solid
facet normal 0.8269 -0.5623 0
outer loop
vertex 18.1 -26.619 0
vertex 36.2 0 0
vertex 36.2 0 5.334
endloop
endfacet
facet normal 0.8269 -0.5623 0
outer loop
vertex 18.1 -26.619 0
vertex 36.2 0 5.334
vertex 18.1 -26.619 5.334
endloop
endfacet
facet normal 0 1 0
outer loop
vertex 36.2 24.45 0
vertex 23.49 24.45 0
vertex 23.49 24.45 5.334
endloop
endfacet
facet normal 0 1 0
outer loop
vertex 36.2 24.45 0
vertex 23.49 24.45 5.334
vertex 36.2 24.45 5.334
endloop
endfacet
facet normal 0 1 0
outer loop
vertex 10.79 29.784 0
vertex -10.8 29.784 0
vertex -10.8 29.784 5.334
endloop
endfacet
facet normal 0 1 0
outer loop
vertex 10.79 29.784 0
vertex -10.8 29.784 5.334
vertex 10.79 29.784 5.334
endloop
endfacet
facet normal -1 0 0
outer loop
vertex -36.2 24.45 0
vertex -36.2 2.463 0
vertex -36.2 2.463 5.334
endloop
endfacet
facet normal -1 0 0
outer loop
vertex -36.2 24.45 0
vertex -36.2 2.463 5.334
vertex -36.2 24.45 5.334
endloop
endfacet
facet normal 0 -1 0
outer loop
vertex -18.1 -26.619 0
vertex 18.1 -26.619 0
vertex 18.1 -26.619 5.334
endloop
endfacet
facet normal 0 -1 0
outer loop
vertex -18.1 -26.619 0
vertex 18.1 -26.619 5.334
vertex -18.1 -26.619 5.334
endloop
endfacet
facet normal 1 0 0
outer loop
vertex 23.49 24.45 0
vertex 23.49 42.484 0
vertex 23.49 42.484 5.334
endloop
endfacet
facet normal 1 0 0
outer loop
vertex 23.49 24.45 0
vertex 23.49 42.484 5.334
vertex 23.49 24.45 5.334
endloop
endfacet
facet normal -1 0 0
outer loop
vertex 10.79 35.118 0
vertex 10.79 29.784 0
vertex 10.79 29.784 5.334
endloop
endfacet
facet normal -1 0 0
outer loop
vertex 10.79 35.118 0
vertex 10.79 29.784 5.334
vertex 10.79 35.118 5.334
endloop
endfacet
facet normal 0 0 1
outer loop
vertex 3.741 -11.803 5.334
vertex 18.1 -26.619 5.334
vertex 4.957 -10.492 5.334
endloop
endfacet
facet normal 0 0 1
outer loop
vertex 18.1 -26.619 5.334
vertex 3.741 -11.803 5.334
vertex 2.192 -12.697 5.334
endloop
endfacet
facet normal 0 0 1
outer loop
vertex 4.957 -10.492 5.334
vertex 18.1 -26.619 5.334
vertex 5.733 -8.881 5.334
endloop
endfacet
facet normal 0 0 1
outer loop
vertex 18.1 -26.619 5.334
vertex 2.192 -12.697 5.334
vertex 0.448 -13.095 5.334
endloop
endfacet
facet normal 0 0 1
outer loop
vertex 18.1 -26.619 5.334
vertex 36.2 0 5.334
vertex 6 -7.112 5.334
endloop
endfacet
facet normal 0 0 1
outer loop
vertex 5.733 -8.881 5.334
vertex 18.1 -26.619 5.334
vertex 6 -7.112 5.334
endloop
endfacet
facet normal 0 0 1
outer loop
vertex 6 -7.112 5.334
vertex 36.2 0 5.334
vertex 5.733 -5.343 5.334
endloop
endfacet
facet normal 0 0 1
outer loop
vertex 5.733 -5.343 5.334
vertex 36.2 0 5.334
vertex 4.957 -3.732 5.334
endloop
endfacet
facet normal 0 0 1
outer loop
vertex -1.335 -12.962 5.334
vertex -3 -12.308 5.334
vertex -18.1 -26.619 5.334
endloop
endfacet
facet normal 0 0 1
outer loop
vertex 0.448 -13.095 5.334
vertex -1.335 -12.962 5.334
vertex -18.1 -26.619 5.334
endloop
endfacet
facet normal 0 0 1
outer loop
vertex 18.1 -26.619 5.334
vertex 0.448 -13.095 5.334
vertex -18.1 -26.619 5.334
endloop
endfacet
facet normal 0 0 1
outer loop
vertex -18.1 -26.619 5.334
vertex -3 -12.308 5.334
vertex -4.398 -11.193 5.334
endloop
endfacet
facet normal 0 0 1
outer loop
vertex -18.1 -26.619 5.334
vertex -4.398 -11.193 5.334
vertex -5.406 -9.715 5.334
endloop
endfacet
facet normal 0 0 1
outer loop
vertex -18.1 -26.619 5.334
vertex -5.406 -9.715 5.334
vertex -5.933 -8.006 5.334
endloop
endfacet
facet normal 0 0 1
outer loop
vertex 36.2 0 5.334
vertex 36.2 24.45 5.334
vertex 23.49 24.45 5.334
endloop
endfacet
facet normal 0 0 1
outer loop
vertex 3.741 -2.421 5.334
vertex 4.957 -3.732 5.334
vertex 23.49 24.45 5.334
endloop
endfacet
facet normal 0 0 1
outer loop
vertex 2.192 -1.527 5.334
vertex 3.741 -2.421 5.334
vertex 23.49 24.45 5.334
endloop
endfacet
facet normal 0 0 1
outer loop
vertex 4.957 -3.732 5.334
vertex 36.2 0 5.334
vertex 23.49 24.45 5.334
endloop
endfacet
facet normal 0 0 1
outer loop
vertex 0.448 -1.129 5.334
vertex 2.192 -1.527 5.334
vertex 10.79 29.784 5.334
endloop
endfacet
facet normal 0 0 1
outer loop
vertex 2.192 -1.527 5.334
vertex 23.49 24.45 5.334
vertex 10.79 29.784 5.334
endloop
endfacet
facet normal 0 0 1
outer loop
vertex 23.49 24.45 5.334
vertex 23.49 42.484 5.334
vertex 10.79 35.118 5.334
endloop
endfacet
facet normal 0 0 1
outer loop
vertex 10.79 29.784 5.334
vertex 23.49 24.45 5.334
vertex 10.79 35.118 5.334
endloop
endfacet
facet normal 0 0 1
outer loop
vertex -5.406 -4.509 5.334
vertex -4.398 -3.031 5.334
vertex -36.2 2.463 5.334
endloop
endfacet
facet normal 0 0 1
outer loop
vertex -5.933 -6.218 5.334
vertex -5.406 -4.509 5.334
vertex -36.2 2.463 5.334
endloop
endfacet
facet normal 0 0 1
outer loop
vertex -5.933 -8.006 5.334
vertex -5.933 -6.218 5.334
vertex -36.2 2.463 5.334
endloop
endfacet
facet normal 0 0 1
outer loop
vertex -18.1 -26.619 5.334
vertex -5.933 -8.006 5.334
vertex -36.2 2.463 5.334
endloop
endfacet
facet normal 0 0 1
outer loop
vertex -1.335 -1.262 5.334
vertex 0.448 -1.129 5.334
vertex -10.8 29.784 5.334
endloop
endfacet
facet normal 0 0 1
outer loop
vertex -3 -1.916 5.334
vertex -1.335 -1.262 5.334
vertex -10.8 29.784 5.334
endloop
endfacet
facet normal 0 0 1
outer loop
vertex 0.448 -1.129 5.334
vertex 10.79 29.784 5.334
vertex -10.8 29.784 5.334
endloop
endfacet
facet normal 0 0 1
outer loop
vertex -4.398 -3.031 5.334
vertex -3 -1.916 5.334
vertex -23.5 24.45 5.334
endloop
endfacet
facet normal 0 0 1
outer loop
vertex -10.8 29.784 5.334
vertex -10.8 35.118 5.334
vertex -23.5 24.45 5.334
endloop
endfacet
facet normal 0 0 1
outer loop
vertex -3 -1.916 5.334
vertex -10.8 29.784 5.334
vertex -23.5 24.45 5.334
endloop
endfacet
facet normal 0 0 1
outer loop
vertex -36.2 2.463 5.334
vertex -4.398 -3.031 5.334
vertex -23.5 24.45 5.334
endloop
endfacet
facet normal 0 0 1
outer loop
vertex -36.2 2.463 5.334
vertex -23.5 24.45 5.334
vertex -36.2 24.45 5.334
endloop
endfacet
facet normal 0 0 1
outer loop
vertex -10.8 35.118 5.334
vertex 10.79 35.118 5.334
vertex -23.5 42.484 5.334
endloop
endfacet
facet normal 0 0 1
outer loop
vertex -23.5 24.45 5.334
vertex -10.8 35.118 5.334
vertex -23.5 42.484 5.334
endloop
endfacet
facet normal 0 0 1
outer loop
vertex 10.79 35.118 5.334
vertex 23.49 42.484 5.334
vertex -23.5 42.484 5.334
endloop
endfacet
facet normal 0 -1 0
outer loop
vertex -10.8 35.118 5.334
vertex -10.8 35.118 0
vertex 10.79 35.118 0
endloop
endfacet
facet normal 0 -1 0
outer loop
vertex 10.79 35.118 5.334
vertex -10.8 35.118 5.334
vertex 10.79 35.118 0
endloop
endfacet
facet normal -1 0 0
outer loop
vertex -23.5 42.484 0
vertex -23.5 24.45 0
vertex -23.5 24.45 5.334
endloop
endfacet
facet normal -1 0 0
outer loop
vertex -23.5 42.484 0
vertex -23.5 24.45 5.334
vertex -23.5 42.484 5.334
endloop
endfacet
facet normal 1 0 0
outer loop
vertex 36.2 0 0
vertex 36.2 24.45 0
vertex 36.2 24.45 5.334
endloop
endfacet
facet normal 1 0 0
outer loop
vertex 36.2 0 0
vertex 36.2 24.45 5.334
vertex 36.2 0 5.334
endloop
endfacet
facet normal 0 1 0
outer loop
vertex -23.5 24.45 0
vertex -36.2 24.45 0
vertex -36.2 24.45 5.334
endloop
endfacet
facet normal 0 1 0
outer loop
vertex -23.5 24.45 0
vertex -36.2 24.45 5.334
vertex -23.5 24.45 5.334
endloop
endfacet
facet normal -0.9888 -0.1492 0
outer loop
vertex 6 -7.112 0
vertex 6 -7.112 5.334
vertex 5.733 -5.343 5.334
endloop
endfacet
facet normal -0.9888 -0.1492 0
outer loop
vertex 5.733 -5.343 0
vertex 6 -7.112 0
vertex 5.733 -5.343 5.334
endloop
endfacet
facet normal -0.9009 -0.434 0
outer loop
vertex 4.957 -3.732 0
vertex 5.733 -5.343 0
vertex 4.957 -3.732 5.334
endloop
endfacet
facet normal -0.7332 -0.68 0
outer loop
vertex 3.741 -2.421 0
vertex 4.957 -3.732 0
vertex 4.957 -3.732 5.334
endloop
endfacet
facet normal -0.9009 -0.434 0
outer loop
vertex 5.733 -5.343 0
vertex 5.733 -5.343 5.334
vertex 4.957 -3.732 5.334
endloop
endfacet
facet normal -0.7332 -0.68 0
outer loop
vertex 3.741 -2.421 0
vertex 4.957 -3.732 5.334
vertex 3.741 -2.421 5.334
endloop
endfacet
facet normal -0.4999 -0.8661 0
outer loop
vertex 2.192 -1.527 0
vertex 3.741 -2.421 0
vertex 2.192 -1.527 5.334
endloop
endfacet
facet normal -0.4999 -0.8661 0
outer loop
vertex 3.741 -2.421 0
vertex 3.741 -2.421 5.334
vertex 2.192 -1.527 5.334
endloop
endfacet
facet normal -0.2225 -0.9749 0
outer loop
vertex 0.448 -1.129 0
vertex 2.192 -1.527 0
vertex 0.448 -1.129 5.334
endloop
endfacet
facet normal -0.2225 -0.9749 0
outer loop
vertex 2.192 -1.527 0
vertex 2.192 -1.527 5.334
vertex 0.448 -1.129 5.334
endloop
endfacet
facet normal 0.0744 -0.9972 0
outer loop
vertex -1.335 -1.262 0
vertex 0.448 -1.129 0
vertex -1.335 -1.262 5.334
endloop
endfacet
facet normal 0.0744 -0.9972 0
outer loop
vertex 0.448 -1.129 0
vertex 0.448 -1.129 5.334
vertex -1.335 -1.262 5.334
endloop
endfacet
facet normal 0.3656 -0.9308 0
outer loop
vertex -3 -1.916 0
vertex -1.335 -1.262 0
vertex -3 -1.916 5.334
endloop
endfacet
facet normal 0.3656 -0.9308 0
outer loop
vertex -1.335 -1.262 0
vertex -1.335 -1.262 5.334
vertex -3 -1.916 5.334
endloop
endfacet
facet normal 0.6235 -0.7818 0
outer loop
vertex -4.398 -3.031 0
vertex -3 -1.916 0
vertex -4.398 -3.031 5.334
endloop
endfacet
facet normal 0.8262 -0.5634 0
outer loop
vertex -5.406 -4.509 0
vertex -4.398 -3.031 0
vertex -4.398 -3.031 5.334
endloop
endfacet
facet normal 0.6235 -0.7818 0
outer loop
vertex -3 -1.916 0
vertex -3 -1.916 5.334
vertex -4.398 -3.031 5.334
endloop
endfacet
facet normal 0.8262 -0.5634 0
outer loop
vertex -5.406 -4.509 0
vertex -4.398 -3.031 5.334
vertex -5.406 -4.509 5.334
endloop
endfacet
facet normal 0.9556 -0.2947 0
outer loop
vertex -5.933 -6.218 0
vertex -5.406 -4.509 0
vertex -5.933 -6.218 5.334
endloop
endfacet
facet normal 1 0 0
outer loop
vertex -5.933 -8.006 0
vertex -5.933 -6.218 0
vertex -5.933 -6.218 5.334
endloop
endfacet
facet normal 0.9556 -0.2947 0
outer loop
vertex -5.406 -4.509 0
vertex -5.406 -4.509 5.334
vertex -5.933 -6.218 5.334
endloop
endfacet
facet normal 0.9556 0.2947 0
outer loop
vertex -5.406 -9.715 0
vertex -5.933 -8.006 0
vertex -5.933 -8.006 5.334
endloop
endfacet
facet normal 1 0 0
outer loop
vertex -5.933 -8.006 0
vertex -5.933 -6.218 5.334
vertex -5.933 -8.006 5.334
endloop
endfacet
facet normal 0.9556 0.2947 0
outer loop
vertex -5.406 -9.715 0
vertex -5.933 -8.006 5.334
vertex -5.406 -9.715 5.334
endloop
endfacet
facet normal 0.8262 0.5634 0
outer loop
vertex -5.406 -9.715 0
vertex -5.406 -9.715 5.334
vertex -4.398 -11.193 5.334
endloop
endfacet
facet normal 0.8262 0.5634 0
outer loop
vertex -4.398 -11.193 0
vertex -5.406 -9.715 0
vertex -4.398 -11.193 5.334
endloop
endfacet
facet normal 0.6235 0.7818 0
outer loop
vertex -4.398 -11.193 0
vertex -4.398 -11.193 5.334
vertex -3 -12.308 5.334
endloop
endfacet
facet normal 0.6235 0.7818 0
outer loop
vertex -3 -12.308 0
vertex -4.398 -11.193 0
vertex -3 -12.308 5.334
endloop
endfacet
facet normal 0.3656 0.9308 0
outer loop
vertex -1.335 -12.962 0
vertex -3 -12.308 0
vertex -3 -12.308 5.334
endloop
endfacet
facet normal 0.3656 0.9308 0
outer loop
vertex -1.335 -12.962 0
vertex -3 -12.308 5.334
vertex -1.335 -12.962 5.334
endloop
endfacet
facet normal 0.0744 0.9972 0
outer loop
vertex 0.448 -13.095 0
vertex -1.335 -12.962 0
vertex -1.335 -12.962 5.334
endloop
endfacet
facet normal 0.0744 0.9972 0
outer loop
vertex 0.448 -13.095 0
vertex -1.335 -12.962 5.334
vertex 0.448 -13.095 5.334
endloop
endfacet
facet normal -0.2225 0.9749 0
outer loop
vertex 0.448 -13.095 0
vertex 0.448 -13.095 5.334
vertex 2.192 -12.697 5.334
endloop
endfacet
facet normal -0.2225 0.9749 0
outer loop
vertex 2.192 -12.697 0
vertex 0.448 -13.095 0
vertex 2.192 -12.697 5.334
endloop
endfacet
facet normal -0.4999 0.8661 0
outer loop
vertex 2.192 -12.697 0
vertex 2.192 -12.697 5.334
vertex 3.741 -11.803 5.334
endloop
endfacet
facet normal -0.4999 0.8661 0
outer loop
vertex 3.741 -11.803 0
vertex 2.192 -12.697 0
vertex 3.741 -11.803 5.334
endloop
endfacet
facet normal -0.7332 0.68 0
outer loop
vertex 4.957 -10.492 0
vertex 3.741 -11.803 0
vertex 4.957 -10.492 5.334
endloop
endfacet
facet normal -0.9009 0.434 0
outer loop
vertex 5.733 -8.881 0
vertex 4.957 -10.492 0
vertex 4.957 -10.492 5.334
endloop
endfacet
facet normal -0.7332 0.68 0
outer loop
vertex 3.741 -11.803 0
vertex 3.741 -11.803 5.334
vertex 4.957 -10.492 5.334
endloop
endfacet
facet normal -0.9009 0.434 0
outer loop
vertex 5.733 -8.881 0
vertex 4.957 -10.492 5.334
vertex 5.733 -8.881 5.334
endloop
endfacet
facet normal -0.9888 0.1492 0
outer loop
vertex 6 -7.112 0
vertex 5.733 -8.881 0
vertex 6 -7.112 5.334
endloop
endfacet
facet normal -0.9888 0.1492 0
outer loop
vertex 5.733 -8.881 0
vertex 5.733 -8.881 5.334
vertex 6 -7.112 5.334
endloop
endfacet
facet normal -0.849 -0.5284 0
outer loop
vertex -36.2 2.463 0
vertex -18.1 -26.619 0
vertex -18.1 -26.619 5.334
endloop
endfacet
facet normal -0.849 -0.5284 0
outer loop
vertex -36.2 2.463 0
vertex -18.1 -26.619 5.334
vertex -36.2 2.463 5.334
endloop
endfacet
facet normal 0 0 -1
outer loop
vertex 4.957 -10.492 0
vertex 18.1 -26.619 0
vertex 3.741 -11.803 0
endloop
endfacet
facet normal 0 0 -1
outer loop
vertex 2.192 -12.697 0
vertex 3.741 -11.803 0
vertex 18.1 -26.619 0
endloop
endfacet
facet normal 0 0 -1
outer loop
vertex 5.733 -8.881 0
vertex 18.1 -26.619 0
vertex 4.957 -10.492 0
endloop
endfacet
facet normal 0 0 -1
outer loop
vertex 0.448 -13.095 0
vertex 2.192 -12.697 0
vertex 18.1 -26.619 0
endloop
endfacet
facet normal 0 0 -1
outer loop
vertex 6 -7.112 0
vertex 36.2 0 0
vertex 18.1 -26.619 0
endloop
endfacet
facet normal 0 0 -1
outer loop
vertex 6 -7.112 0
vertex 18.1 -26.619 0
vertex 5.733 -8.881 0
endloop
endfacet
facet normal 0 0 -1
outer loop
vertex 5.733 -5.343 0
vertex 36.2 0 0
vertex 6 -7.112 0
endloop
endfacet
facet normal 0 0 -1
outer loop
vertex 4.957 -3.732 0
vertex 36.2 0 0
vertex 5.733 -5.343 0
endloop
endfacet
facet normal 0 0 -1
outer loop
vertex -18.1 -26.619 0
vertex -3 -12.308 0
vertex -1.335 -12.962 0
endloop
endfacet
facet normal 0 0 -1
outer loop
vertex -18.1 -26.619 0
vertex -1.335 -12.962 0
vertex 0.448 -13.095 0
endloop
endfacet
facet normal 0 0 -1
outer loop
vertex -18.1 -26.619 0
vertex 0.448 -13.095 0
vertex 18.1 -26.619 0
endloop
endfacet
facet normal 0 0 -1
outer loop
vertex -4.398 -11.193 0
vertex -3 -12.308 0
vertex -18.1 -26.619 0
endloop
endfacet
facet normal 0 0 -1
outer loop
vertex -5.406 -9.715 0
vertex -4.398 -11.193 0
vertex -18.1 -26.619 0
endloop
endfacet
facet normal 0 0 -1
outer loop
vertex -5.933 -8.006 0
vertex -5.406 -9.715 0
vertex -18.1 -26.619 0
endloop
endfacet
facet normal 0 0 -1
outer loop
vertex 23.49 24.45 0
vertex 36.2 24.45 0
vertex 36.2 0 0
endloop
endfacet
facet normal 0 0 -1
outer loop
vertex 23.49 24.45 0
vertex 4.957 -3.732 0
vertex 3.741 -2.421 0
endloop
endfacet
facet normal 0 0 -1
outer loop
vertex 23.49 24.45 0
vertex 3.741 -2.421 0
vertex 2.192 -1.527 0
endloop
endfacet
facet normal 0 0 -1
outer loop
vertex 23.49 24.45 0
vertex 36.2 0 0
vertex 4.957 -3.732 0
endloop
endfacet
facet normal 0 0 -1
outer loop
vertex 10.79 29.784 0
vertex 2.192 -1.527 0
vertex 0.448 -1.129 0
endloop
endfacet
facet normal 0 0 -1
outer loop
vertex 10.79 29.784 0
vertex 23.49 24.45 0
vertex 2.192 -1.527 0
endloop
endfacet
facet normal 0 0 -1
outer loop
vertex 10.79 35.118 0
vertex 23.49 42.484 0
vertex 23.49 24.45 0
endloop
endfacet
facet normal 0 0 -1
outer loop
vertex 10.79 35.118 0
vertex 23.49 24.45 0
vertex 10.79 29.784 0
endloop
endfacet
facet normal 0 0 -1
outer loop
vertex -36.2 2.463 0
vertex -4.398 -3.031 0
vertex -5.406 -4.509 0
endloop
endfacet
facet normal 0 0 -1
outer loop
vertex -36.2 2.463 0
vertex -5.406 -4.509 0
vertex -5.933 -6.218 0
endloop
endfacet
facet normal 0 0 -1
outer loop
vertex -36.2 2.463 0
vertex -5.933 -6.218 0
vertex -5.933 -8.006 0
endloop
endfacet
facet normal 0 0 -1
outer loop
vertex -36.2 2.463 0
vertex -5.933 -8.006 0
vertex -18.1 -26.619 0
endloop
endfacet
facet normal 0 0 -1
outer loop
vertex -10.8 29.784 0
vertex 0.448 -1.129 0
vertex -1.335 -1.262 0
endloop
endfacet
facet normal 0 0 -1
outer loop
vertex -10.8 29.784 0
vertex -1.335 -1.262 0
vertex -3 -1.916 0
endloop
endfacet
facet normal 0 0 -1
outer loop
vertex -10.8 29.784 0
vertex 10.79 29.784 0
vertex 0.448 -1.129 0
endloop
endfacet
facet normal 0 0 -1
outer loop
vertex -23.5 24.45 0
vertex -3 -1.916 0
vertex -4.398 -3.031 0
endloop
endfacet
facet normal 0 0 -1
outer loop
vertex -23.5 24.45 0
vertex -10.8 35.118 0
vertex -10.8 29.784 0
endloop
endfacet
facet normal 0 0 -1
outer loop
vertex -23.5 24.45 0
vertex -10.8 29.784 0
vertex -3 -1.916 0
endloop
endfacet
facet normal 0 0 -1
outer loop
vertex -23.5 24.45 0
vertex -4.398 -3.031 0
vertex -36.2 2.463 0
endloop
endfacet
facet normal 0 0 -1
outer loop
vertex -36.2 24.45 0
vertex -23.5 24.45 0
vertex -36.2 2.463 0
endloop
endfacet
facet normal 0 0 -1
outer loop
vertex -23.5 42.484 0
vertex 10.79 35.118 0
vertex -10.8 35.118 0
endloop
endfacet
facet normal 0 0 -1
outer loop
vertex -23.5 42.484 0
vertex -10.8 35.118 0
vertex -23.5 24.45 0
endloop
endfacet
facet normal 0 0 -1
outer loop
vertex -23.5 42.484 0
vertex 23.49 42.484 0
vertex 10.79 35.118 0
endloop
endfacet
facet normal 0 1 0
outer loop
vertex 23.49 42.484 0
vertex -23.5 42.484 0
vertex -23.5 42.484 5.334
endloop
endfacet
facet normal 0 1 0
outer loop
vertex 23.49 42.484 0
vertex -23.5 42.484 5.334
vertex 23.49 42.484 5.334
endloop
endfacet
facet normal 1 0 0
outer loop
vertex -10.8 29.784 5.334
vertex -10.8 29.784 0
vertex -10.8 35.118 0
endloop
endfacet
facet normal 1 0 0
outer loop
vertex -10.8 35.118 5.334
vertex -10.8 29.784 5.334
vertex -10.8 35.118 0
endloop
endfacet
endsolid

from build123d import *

# Parameters (mm, degrees)
SKETCH1_W           = 21.59
SKETCH1_H           = 5.334
BOSS_EXTRUDE1_DEPTH = 5.334
SKETCH2_R           = 6
CUT_EXTRUDE1_DEPTH  = 5.334


with BuildPart() as part:
    # Sketch1 → Boss-Extrude1 (new body)
    with BuildSketch(Plane.XY):
        Polygon((-36.2, 24.449992223), (-23.5, 24.449992223), (-23.5, 42.483992223), (23.49, 42.483992223), (23.49, 24.449992223), (36.2, 24.449992223), (36.2, -7.777e-06), (18.1, -26.619054692), (-18.1, -26.619054692), (-36.2, 2.462571049), align=None)
        with Locations((-0.005, 32.451)):
            Rectangle(SKETCH1_W, SKETCH1_H, mode=Mode.SUBTRACT)
    extrude(amount=BOSS_EXTRUDE1_DEPTH)

    # Sketch2 → Cut-Extrude1 (cut)
    with BuildSketch(Plane.XY.offset(5.334)):
        with Locations((0, -7.112000122)):
            Circle(SKETCH2_R)
    extrude(amount=-CUT_EXTRUDE1_DEPTH, mode=Mode.SUBTRACT)


solid = part.part
